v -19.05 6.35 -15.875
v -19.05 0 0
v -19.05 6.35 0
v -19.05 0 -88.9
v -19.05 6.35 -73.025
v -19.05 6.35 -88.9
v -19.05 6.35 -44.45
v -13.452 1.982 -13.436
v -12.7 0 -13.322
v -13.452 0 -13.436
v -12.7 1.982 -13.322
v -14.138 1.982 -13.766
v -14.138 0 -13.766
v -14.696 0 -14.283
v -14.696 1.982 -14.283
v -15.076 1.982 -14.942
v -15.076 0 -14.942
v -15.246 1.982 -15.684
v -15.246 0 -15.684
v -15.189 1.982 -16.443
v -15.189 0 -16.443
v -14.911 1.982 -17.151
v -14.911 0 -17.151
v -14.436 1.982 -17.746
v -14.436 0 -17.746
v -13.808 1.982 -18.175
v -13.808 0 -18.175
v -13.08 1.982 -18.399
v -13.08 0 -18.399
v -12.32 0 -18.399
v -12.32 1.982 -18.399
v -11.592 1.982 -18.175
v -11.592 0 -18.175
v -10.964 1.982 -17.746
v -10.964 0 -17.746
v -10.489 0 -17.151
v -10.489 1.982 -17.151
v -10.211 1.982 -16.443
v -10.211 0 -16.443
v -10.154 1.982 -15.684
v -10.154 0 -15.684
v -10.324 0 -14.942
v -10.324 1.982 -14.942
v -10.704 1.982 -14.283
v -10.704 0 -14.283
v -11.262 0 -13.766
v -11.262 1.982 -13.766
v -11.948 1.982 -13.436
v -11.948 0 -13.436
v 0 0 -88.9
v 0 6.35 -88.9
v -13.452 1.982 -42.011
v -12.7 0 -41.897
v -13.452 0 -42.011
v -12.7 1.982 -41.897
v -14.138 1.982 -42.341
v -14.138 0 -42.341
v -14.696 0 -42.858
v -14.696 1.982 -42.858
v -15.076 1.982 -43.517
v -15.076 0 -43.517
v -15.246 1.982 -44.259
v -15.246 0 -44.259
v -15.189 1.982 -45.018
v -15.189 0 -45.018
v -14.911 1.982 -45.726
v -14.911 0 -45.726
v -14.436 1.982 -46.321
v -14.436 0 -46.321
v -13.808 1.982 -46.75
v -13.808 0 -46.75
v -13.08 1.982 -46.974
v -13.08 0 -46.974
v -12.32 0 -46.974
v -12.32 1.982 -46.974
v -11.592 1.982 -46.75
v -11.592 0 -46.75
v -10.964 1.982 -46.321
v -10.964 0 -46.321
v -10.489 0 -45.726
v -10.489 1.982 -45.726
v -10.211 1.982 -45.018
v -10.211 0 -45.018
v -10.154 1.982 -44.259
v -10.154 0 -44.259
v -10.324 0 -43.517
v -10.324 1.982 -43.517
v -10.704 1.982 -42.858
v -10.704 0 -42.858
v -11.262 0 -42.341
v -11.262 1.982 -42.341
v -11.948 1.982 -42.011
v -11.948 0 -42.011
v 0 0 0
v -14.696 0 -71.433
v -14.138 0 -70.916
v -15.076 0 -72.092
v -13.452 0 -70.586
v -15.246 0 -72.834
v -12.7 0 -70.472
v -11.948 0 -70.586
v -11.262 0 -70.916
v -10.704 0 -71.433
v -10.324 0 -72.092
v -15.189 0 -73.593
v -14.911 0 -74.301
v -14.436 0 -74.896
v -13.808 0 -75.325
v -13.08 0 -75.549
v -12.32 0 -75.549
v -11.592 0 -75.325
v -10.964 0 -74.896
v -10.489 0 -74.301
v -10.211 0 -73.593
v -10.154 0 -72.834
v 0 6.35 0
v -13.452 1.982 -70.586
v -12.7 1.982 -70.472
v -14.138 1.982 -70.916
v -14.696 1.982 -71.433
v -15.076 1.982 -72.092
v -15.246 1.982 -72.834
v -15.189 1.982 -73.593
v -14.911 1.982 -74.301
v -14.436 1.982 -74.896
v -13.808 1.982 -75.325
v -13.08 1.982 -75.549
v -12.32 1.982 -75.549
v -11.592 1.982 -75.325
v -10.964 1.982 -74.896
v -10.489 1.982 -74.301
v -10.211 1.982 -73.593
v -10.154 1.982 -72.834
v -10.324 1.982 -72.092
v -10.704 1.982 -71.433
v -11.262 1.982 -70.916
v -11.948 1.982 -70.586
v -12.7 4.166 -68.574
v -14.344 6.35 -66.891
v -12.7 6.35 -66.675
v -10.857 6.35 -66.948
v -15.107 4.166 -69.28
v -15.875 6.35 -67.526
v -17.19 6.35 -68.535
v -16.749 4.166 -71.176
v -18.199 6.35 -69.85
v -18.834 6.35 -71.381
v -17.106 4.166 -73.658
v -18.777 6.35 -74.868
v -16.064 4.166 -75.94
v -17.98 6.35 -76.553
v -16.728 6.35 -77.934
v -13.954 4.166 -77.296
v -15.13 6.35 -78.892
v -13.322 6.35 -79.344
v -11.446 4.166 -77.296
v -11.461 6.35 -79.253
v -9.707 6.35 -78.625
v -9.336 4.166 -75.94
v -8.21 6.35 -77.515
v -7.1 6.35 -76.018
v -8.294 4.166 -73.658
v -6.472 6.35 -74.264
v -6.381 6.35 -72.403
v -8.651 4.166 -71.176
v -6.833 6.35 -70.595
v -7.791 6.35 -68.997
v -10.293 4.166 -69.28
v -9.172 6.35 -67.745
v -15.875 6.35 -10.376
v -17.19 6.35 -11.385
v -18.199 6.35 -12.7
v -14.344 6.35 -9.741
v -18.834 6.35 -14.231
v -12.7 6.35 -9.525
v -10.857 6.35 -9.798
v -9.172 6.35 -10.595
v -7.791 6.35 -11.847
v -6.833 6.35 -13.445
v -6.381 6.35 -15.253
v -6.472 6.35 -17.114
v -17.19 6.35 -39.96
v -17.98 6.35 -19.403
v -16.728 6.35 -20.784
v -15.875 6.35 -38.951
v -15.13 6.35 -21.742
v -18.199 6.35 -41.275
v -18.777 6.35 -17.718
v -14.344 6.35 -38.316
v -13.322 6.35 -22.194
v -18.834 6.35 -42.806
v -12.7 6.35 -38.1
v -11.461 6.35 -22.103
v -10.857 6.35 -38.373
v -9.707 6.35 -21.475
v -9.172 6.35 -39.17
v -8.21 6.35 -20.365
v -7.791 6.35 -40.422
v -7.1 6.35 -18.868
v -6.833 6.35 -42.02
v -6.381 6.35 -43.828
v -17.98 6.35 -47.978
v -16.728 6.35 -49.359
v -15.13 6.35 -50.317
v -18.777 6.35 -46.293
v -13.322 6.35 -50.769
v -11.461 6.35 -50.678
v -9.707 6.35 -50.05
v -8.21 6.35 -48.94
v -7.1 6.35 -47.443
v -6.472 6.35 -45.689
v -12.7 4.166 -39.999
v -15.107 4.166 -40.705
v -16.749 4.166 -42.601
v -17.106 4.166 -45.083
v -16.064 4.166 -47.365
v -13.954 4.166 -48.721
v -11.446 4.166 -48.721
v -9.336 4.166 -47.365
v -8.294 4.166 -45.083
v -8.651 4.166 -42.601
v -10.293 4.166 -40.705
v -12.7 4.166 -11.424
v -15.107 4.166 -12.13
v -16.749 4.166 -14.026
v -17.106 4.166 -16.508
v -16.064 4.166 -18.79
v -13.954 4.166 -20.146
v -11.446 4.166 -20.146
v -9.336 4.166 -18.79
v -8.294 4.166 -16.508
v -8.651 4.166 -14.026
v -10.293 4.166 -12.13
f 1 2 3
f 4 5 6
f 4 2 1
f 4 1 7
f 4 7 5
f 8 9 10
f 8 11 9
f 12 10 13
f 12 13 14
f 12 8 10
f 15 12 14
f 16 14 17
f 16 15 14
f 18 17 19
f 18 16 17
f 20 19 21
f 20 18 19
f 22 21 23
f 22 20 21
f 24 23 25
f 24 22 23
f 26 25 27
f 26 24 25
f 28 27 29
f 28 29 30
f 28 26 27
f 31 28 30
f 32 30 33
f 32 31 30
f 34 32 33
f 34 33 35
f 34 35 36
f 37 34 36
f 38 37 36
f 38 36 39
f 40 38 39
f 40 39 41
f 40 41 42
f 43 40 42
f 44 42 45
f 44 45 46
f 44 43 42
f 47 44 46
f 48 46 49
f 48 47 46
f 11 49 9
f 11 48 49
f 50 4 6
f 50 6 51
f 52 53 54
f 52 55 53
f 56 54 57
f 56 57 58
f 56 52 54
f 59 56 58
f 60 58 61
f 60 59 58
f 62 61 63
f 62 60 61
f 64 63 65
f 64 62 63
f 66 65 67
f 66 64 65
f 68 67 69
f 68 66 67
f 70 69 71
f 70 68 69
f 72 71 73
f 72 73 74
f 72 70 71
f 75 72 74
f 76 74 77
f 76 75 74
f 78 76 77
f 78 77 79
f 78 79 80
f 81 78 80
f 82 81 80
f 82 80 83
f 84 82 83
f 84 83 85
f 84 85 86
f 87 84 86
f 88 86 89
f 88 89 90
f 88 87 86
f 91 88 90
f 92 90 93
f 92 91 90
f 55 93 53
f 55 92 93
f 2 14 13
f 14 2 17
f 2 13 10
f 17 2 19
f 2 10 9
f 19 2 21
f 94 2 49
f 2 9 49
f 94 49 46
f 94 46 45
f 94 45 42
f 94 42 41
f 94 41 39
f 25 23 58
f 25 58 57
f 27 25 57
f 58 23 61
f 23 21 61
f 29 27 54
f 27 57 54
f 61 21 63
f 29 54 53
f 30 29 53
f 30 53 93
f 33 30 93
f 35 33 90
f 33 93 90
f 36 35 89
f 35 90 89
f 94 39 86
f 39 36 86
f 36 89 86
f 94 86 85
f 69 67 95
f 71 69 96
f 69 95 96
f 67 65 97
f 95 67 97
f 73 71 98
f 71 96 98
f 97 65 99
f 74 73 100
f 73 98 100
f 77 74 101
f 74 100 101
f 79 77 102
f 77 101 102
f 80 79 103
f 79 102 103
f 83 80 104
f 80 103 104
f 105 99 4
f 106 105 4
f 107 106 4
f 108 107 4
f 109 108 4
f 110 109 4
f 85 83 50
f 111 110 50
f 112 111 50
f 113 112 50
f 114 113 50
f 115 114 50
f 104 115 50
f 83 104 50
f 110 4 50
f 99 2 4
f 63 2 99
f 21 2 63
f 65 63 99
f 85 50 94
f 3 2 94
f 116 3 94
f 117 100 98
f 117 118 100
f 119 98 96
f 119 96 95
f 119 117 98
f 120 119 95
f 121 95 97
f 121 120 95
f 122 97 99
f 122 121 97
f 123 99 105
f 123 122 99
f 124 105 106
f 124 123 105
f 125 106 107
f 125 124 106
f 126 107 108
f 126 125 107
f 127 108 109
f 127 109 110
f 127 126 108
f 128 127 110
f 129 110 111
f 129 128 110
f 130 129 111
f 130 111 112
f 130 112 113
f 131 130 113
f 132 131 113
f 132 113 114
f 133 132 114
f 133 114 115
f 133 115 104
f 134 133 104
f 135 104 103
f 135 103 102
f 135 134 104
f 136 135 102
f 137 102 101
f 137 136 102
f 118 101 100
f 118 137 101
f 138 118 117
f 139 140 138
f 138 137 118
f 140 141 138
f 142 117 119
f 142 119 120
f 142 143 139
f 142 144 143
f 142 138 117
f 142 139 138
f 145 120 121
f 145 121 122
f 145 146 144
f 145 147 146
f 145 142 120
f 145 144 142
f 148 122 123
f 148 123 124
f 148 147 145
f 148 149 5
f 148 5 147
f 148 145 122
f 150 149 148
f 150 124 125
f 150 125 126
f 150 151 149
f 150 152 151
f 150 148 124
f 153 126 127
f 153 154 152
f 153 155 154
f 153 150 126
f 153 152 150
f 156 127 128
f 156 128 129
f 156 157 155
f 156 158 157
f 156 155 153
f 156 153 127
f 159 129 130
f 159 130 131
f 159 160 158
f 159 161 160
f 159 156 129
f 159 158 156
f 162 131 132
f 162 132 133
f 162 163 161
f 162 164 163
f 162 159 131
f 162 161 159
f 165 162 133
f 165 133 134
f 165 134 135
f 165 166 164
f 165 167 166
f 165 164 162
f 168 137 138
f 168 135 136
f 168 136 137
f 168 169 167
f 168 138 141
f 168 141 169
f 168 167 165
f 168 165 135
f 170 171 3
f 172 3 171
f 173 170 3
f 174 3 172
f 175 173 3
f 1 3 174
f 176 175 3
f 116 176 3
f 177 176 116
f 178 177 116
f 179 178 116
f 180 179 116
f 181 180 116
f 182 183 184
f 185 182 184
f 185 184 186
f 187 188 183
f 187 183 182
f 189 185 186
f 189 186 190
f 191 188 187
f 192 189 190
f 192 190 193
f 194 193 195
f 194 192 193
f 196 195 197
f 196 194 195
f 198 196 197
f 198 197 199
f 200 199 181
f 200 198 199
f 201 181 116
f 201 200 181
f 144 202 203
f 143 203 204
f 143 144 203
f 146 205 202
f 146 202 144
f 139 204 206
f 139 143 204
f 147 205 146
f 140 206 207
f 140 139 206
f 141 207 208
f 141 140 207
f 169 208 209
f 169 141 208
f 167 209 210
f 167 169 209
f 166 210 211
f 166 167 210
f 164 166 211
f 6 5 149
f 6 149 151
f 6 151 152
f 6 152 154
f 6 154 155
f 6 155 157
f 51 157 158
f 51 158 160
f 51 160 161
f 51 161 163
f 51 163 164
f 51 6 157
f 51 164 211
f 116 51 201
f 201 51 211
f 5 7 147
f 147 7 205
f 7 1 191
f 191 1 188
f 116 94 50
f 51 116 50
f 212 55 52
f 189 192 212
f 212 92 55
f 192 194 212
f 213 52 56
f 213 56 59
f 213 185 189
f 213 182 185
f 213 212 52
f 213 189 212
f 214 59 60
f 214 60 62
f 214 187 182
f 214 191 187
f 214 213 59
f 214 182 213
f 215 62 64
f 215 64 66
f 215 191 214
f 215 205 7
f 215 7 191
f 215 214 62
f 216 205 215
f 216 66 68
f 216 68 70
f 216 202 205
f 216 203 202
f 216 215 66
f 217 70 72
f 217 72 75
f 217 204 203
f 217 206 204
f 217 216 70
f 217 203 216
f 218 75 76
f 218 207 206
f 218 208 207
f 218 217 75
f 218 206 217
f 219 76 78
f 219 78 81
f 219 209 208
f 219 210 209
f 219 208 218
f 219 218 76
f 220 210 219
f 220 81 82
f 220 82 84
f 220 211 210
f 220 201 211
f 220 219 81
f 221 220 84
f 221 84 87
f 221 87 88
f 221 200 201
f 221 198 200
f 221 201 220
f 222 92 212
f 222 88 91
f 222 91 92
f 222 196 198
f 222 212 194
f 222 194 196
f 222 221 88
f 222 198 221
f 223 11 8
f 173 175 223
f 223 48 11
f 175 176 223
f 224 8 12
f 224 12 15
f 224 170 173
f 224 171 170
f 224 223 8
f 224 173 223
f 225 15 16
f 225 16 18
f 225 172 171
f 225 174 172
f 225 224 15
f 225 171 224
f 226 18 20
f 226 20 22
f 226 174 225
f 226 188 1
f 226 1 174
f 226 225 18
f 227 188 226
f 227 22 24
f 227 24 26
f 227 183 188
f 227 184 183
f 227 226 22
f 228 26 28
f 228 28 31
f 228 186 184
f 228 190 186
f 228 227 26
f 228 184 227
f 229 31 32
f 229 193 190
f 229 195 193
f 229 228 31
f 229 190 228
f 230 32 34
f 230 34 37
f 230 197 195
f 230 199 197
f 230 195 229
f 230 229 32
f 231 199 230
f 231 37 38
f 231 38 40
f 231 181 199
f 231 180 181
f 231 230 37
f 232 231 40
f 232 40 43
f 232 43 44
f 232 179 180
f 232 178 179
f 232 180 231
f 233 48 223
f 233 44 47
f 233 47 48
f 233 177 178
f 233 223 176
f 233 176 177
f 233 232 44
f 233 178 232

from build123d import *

# Parameters (mm, degrees)
SKETCH1_W                        = 19.05
SKETCH1_H                        = 88.9
BOSS_EXTRUDE1_DEPTH              = 6.35
F_1_4_20_TAPPED_HOLE1_AT_2_COUNT = 2
F_1_4_20_TAPPED_HOLE1_AT_2_PITCH = 28.575
F_1_4_20_TAPPED_HOLE1_AT_3_COUNT = 2
F_1_4_20_TAPPED_HOLE1_AT_3_PITCH = 57.15


with BuildPart() as part:
    # Sketch1 → Boss-Extrude1 (new body)
    with BuildSketch(Plane(origin=(0, 0, 0), x_dir=(1, 0, 0), z_dir=(0, 1, 0))):
        with Locations((-9.525, 44.45)):
            Rectangle(SKETCH1_W, SKETCH1_H)
    extrude(amount=BOSS_EXTRUDE1_DEPTH)

    # Sketch3 → 1/4-20 Tapped Hole1 (revolve, cut)
    with BuildSketch(Plane(origin=(-12.7, 6.35, -15.875), x_dir=(0, 0, 1), z_dir=(1, 0, 0))):
        Polygon((0, 0), (0, 6.35), (2.5527, 6.35), (2.5527, 4.368293953), (6.35, 0), align=None)
    f_1_4_20_tapped_hole1 = revolve(axis=Axis((-12.7, 12.7, -15.875), (0, -1, 0)), mode=Mode.SUBTRACT)

    # 1/4-20 Tapped Hole1 at 2: 1/4-20 Tapped Hole1 ×2
    with Locations(*[(0, 0, -i * F_1_4_20_TAPPED_HOLE1_AT_2_PITCH) for i in range(1, F_1_4_20_TAPPED_HOLE1_AT_2_COUNT)]):
        add(f_1_4_20_tapped_hole1, mode=Mode.SUBTRACT)

    # 1/4-20 Tapped Hole1 at 3: 1/4-20 Tapped Hole1 ×2
    with Locations(*[(0, 0, -i * F_1_4_20_TAPPED_HOLE1_AT_3_PITCH) for i in range(1, F_1_4_20_TAPPED_HOLE1_AT_3_COUNT)]):
        add(f_1_4_20_tapped_hole1, mode=Mode.SUBTRACT)


solid = part.part
